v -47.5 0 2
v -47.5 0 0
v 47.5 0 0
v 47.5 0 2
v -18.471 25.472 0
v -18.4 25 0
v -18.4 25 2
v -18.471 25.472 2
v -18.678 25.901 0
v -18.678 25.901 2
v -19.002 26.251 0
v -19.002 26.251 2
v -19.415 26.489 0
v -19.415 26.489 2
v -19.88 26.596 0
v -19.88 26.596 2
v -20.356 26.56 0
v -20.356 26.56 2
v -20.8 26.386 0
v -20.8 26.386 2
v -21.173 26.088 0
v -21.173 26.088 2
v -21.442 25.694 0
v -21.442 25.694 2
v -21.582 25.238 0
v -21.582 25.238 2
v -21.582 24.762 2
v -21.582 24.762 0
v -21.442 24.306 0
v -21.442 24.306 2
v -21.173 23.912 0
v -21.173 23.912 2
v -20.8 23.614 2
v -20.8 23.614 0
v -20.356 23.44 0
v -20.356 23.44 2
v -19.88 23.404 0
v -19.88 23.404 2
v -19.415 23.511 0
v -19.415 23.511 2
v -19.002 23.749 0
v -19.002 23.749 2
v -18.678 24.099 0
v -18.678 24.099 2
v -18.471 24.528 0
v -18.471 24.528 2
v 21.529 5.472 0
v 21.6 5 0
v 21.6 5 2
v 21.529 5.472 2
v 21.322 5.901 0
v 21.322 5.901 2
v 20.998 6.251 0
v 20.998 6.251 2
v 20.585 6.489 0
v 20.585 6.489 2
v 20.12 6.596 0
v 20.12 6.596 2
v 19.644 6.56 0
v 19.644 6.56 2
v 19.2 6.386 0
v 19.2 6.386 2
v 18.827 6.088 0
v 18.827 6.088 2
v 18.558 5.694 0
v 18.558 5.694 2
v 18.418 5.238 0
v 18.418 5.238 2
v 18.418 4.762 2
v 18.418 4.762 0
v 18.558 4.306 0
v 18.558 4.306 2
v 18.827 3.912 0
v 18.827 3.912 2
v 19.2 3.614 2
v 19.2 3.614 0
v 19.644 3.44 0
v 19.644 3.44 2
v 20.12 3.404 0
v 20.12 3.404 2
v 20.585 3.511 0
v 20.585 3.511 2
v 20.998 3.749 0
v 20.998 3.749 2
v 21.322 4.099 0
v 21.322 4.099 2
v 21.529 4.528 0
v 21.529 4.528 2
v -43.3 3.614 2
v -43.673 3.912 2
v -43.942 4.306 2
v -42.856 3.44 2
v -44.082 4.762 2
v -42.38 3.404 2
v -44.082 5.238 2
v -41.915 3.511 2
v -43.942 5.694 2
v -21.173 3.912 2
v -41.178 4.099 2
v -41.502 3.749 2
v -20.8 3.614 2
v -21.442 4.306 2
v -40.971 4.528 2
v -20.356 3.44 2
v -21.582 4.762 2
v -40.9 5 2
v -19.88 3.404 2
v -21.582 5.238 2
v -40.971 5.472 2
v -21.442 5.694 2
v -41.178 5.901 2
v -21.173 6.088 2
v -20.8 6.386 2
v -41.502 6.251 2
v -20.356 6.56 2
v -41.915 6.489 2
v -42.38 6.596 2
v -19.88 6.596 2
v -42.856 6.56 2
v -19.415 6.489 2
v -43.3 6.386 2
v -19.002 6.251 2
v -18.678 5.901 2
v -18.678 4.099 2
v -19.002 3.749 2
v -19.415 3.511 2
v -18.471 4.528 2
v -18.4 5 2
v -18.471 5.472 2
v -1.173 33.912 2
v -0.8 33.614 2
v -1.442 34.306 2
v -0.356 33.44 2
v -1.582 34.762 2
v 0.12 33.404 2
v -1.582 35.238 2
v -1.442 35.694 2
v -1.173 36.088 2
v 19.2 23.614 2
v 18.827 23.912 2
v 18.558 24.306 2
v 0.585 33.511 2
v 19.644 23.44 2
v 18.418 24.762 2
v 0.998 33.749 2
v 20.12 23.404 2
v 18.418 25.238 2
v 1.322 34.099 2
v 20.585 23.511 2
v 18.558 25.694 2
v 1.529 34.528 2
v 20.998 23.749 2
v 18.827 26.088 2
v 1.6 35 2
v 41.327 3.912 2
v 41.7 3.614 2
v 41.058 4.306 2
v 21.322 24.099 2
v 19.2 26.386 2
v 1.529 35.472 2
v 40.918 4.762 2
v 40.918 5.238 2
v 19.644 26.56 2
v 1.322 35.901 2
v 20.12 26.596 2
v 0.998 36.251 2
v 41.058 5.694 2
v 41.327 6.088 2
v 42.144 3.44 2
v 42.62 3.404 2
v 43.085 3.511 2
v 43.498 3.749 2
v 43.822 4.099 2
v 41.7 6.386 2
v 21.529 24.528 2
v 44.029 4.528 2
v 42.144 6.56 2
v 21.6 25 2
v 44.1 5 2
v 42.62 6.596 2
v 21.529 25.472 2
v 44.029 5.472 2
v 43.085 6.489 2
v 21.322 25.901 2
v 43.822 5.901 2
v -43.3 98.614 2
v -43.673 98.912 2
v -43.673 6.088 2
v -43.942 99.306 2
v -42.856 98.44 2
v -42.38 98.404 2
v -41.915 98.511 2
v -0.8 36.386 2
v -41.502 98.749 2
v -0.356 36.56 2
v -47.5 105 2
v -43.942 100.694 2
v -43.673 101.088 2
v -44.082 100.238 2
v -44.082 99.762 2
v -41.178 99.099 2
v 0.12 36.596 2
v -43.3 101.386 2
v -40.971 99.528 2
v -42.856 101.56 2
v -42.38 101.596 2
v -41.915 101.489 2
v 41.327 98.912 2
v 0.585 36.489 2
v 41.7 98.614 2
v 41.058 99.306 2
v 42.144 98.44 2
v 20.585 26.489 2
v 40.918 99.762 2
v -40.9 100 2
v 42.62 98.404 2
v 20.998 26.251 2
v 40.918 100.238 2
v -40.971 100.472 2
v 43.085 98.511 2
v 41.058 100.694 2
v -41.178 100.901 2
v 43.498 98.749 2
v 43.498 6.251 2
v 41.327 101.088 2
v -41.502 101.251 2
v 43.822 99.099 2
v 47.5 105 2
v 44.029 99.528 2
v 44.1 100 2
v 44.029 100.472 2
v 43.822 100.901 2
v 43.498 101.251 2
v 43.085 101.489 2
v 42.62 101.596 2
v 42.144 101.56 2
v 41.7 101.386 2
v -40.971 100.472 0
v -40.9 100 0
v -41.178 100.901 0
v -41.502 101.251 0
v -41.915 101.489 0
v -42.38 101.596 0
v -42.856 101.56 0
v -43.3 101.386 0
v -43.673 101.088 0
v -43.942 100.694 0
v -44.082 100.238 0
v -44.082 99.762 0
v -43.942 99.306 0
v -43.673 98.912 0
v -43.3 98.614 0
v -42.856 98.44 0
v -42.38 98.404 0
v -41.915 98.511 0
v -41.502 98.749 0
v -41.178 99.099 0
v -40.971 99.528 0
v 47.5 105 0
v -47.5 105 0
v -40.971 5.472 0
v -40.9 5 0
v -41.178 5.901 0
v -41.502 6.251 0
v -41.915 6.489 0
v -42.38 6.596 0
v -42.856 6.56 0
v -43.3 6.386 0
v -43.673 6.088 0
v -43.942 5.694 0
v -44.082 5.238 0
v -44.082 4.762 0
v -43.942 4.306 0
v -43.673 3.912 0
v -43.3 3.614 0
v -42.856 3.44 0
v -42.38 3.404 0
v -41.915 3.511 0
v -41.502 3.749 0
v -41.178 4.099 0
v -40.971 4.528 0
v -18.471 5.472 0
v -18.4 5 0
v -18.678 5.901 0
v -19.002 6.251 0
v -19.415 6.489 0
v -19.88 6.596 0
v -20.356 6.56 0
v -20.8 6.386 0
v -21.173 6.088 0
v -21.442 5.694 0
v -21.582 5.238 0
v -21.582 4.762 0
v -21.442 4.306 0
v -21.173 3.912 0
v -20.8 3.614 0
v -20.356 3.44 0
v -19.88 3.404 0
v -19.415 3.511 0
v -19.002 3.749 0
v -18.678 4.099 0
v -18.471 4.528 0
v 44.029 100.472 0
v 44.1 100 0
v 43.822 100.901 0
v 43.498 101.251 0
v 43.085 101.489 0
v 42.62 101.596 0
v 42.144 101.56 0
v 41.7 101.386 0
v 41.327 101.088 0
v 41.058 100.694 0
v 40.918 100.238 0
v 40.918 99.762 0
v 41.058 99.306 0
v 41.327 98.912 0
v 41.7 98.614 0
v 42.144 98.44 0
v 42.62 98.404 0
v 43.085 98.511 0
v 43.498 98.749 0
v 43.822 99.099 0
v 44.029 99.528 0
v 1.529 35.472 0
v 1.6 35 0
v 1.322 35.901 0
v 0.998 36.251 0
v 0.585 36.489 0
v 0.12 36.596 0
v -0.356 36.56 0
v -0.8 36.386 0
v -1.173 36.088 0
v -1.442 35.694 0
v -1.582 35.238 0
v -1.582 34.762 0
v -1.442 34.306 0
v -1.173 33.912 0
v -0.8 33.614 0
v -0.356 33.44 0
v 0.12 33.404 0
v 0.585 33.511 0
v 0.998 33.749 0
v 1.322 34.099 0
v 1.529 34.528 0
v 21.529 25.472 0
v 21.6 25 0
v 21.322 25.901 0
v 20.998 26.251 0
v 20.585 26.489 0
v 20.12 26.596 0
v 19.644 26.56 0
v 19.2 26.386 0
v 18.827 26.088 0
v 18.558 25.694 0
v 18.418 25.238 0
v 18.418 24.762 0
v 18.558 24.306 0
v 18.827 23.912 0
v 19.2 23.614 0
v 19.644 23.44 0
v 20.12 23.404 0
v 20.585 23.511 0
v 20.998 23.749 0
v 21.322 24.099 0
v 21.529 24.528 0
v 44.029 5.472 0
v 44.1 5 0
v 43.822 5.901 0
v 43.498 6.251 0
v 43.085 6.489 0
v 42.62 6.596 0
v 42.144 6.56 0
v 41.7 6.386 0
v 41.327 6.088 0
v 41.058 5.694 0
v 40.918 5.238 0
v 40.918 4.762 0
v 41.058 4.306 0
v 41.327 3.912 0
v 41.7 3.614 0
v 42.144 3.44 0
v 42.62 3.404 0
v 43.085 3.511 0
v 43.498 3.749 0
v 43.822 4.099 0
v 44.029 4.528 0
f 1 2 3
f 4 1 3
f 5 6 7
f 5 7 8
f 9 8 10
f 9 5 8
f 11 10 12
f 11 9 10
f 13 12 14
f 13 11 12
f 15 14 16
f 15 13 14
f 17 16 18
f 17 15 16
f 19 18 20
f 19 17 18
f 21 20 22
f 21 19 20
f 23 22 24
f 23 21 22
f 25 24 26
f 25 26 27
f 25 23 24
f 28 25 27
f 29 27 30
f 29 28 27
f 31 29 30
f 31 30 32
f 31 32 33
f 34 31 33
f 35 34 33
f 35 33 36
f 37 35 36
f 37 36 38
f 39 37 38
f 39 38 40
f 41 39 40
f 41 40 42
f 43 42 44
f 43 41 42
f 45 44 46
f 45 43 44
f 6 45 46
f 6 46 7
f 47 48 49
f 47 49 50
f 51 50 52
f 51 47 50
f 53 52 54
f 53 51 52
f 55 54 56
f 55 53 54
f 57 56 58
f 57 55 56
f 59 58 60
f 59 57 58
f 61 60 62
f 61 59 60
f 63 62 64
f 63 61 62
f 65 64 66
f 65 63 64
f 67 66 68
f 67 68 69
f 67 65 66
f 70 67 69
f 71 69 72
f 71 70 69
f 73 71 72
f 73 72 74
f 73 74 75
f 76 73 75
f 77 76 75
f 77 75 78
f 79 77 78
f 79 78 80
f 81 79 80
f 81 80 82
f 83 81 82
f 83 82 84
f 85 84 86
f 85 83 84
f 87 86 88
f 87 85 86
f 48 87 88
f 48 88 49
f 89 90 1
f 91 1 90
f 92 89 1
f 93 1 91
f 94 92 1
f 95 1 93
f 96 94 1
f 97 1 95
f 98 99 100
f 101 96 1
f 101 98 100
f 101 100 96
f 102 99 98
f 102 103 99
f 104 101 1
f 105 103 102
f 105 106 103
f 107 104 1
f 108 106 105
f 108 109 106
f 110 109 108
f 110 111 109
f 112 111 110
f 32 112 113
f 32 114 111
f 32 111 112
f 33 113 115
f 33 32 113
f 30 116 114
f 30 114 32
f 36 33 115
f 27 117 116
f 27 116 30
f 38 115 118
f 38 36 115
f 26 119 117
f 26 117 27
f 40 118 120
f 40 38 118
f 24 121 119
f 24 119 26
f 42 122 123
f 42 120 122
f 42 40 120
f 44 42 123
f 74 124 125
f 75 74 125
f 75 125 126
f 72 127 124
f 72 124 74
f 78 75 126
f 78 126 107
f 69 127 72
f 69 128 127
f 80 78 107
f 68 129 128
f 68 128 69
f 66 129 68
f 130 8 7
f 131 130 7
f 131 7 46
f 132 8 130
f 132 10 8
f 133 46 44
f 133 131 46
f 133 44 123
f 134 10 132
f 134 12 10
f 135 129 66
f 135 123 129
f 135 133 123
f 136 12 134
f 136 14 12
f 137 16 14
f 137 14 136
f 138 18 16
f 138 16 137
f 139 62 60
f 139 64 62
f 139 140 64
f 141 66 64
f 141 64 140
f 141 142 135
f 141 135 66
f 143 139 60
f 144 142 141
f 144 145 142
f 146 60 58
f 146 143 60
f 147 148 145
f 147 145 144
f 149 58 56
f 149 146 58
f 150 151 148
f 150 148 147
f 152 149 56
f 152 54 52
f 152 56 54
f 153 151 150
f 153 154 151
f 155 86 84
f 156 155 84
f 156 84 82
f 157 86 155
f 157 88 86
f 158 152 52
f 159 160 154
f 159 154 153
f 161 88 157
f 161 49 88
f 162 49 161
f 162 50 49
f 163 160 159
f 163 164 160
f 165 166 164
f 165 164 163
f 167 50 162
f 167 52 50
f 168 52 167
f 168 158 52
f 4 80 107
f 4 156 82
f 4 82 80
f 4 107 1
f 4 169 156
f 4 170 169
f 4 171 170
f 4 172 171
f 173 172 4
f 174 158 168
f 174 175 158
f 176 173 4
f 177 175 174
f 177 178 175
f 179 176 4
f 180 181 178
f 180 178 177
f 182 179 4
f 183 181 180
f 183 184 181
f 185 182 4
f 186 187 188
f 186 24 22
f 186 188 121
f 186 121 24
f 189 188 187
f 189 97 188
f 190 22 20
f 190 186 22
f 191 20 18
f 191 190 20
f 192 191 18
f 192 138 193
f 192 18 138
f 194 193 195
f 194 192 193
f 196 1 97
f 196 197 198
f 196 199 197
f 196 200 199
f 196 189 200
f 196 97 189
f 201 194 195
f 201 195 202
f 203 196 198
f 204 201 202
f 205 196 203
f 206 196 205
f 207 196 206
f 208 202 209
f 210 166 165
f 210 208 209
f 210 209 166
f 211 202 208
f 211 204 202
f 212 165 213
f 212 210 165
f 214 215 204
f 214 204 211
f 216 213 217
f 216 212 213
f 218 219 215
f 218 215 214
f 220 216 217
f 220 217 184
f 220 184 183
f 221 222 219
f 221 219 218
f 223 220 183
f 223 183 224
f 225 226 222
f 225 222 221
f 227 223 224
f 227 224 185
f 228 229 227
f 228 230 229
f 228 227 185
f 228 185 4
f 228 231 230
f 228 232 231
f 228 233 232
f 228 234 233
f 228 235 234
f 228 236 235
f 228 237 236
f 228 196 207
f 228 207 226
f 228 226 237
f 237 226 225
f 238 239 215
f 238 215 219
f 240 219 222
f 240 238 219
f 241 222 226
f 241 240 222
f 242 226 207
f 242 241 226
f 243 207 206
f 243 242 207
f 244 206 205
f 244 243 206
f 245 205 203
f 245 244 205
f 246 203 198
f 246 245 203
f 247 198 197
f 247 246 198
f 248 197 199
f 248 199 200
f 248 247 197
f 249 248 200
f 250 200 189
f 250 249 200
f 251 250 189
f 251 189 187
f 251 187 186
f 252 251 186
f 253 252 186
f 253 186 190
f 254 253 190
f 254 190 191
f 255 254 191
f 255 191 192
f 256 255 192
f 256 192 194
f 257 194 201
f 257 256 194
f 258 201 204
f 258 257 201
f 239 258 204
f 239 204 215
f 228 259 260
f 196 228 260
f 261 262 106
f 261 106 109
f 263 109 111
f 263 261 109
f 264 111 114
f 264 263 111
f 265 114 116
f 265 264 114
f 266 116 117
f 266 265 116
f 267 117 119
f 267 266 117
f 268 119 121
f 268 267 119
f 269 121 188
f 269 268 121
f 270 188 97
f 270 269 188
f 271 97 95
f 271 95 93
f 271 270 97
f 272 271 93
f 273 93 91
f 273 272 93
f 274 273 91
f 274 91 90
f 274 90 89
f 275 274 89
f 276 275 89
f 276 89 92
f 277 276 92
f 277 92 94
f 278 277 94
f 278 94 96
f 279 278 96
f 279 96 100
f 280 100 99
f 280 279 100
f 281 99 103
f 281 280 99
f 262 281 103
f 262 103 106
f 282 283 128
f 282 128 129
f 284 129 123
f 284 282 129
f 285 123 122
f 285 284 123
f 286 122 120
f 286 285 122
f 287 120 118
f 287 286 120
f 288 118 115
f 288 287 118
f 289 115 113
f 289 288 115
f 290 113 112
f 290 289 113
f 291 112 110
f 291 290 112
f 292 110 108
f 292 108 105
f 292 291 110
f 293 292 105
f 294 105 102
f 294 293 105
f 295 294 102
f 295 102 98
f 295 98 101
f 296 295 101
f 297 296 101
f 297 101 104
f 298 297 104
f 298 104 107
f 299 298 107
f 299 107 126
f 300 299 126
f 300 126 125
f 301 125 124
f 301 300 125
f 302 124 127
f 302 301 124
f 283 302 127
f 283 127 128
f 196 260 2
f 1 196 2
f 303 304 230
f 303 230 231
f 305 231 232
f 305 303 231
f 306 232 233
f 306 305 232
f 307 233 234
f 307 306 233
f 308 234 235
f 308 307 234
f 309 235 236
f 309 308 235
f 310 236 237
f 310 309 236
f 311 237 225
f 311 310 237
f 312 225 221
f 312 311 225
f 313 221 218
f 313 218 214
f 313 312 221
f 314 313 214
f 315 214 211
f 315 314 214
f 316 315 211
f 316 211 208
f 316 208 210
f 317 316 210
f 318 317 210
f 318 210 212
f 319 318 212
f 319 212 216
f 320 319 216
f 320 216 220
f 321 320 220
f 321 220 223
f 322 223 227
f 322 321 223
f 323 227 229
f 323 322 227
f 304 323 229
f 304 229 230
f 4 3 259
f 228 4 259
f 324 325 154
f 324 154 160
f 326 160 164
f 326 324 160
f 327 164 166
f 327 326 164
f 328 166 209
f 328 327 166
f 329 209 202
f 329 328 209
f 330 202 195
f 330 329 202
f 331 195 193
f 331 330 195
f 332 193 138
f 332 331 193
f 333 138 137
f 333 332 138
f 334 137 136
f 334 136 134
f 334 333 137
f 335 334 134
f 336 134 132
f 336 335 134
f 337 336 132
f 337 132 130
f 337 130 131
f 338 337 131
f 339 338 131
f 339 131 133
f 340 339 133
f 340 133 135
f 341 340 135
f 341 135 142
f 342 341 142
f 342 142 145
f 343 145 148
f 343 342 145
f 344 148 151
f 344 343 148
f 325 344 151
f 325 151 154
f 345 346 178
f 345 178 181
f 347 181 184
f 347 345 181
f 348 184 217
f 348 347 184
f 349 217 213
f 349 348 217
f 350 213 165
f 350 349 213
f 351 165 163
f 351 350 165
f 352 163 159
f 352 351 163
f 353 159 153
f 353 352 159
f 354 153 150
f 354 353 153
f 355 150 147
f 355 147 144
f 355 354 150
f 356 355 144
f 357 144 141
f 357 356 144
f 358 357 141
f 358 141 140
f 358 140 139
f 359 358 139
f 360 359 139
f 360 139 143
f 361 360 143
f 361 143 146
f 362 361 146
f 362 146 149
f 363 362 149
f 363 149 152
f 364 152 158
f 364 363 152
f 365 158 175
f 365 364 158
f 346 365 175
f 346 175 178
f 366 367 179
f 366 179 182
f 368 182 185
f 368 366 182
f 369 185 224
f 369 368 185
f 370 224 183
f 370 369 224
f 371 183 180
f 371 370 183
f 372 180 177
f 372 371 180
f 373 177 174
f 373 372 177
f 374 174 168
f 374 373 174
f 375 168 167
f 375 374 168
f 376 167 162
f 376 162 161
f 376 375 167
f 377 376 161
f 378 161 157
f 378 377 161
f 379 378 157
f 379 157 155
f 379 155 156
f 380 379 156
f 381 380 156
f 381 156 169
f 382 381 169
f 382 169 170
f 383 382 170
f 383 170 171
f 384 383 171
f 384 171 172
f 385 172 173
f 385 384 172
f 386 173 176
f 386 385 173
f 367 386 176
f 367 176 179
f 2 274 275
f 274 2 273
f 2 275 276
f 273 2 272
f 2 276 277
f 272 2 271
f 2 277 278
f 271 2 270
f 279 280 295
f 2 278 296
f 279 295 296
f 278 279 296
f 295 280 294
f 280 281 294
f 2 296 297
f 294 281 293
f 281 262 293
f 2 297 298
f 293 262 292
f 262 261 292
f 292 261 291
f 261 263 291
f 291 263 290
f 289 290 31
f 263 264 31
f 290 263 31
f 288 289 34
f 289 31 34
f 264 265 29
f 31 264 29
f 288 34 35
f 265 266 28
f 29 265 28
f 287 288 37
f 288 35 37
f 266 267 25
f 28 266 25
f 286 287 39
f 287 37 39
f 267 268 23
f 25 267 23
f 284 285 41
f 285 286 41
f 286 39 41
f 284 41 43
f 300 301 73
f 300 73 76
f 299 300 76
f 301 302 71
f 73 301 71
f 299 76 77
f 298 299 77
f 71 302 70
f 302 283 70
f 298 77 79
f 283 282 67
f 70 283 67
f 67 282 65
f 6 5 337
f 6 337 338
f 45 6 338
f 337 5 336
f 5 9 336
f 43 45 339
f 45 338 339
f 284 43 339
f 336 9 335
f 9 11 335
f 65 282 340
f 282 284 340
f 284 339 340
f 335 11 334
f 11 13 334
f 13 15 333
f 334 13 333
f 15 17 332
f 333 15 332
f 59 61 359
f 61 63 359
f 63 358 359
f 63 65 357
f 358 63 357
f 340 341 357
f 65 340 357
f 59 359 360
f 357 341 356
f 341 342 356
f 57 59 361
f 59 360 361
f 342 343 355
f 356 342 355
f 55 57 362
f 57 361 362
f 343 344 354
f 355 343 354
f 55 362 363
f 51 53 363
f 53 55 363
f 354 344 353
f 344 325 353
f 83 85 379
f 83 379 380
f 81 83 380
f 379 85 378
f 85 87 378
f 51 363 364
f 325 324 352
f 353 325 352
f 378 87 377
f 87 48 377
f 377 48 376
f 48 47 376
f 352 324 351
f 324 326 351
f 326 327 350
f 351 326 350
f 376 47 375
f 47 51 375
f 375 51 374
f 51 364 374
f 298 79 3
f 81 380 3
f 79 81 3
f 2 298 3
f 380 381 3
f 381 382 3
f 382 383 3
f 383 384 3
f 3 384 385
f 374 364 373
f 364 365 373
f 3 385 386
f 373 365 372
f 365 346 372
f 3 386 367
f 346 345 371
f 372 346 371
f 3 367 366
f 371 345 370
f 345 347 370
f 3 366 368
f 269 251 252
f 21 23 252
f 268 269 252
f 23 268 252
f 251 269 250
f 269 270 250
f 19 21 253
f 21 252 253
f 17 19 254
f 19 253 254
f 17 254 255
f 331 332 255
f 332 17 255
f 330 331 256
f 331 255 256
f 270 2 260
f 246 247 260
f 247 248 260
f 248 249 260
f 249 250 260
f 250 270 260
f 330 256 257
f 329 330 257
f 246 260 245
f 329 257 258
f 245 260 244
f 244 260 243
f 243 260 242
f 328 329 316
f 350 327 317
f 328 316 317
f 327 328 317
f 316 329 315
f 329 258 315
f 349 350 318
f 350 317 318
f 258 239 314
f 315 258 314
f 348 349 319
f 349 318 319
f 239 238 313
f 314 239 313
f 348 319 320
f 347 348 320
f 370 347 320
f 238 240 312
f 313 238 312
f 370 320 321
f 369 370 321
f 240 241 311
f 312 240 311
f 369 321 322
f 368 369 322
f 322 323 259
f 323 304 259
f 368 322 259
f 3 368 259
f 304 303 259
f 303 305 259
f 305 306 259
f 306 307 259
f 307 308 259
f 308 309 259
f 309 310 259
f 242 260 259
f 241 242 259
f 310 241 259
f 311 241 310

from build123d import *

# Parameters (mm, degrees)
SKETCH_1_R      = 1.6
SKETCH_1_W      = 50
SKETCH_1_H      = 30
EXTRUDE_3_DEPTH = 2


with BuildPart() as part:
    # 草圖1 → 填料-伸長3 (new body)
    # profile 1 of 2: a face of its own
    with BuildSketch(Plane.XY):
        Polygon((-47.5, 105), (-47.5, 0), (-25, 0), (-25, 30), (25, 30), (25, 0), (47.5, 0), (47.5, 105), align=None)
        with Locations((-42.5, 5)):
            Circle(SKETCH_1_R, mode=Mode.SUBTRACT)
        with Locations((42.5, 5)):
            Circle(SKETCH_1_R, mode=Mode.SUBTRACT)
        with Locations((0, 35)):
            Circle(SKETCH_1_R, mode=Mode.SUBTRACT)
        with Locations((-42.5, 100)):
            Circle(SKETCH_1_R, mode=Mode.SUBTRACT)
        with Locations((42.5, 100)):
            Circle(SKETCH_1_R, mode=Mode.SUBTRACT)
    # profile 2 of 2: a face of its own
    with BuildSketch(Plane.XY):
        with Locations((0, 15)):
            Rectangle(SKETCH_1_W, SKETCH_1_H)
        with Locations((-20, 5)):
            Circle(SKETCH_1_R, mode=Mode.SUBTRACT)
        with Locations((-20, 25)):
            Circle(SKETCH_1_R, mode=Mode.SUBTRACT)
        with Locations((20, 5)):
            Circle(SKETCH_1_R, mode=Mode.SUBTRACT)
        with Locations((20, 25)):
            Circle(SKETCH_1_R, mode=Mode.SUBTRACT)
    extrude(amount=EXTRUDE_3_DEPTH)


solid = part.part
